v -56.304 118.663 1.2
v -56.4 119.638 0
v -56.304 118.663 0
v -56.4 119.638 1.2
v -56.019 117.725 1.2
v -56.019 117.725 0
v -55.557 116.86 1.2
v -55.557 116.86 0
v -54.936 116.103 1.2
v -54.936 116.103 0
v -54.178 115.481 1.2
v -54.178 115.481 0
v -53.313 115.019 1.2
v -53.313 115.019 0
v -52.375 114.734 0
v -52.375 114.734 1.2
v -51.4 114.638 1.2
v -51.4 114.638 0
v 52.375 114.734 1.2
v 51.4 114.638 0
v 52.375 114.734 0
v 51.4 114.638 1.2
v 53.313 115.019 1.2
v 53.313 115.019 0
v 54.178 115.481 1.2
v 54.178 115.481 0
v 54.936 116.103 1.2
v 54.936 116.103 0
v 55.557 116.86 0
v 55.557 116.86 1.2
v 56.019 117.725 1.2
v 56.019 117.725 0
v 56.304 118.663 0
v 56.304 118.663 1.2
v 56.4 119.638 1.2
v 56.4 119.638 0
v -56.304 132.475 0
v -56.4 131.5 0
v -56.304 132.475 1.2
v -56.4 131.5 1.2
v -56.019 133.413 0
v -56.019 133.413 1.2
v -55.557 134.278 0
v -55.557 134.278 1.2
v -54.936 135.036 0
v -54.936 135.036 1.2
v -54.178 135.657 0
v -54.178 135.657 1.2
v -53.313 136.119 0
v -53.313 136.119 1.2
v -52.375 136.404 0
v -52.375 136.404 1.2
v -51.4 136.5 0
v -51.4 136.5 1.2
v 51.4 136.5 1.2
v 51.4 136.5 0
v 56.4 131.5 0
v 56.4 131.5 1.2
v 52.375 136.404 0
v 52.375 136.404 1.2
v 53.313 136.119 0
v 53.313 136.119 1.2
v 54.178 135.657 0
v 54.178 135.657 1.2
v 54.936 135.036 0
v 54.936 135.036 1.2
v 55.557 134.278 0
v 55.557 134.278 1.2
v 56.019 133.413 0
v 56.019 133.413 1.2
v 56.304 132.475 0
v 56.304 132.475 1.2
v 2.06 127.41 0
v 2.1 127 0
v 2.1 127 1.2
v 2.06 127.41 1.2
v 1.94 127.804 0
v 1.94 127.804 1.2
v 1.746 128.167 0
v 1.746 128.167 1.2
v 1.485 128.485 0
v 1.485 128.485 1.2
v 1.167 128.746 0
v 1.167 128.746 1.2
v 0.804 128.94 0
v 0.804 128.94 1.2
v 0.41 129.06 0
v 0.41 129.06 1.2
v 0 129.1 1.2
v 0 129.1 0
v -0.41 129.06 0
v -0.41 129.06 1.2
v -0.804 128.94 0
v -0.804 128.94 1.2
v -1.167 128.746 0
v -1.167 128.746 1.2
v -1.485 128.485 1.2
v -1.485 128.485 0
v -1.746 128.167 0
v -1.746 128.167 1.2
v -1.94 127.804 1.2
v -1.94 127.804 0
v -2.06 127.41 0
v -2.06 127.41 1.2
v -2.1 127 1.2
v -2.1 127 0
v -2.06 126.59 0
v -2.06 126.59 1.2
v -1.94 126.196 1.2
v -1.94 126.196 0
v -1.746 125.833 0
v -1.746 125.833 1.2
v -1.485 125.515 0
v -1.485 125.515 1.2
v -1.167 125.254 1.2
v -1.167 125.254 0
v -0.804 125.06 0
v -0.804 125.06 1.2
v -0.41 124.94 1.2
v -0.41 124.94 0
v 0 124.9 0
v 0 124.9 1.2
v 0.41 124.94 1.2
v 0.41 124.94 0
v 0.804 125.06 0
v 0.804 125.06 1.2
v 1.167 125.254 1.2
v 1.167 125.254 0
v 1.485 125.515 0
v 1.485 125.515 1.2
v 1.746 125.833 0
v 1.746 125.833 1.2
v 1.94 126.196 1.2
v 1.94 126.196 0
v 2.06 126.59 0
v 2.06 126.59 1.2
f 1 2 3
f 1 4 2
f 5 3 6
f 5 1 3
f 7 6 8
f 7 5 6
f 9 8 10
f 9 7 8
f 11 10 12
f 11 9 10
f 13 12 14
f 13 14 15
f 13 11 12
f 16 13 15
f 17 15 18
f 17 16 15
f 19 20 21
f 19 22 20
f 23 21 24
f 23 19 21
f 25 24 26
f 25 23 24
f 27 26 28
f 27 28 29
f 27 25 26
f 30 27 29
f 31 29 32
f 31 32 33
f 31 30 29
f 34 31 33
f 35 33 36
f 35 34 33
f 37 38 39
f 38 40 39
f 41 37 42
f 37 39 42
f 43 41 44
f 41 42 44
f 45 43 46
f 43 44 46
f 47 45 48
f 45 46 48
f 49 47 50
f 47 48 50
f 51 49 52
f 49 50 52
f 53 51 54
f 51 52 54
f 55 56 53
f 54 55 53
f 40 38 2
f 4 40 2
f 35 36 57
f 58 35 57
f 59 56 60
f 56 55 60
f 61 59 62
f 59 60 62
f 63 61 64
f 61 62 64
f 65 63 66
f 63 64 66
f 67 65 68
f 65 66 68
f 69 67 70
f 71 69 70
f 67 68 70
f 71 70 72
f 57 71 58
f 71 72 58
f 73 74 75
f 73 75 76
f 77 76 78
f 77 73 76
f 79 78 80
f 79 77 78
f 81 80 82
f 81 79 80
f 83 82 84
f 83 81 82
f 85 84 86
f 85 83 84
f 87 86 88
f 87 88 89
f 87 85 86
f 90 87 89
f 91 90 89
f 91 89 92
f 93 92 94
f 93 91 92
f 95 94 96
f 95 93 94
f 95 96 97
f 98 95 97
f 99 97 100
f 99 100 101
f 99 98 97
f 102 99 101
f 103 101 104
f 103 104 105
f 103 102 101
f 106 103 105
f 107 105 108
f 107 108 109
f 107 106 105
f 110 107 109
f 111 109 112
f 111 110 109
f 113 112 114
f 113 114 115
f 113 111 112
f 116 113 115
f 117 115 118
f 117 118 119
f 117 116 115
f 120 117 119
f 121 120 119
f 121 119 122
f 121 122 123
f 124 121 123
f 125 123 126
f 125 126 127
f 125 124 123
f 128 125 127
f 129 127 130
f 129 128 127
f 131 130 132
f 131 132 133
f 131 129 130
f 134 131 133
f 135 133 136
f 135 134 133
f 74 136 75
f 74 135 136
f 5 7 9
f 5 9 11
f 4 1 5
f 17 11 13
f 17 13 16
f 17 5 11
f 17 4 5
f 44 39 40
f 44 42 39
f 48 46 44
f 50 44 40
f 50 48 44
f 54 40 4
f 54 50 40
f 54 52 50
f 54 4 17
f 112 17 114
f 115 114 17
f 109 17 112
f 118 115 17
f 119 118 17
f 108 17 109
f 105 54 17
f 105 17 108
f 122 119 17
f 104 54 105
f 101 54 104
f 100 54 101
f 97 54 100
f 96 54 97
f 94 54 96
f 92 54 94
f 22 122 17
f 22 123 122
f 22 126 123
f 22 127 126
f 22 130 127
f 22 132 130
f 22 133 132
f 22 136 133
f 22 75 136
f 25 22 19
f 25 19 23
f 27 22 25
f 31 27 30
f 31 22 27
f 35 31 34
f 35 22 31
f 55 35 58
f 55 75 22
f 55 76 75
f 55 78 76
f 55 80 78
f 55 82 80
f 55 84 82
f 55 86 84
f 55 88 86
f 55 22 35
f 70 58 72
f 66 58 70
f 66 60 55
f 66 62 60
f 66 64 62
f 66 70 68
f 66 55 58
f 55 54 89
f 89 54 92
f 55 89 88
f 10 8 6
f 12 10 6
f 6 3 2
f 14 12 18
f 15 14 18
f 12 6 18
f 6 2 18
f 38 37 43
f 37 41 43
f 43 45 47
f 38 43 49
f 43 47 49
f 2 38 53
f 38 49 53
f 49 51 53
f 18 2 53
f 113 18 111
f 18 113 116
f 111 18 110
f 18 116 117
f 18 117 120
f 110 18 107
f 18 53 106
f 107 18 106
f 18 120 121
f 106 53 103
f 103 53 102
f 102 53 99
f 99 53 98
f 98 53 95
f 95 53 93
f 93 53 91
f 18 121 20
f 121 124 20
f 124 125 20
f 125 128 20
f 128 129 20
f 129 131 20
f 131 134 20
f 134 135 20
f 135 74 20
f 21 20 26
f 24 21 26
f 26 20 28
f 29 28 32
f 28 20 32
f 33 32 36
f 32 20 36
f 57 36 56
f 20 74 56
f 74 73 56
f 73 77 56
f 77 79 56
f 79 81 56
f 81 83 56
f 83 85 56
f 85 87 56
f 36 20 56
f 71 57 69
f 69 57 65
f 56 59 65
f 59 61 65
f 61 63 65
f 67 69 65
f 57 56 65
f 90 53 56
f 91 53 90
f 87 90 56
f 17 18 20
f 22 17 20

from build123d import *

# Parameters (mm, degrees)
SKETCH1_R           = 2.1
BOSS_EXTRUDE1_DEPTH = 1.2
FILLET1_R           = 5


with BuildPart() as part:
    # Sketch1 → Boss-Extrude1 (new body)
    with BuildSketch(Plane.XY):
        Polygon((-56.4, 136.5), (-56.4, 114.638335016), (56.4, 114.638335016), (56.4, 136.5), (0, 136.5), align=None)
        with Locations((0, 127)):
            Circle(SKETCH1_R, mode=Mode.SUBTRACT)
    extrude(amount=BOSS_EXTRUDE1_DEPTH)

    # Fillet1
    fillet1_edges = [part.edges().sort_by_distance(p)[0] for p in [
        (56.4, 114.638335016, 0.6),
        (-56.4, 114.638335016, 0.6),
        (-56.4, 136.5, 0.6),
        (56.4, 136.5, 0.6),
    ]]
    fillet(fillet1_edges, radius=FILLET1_R)


solid = part.part
